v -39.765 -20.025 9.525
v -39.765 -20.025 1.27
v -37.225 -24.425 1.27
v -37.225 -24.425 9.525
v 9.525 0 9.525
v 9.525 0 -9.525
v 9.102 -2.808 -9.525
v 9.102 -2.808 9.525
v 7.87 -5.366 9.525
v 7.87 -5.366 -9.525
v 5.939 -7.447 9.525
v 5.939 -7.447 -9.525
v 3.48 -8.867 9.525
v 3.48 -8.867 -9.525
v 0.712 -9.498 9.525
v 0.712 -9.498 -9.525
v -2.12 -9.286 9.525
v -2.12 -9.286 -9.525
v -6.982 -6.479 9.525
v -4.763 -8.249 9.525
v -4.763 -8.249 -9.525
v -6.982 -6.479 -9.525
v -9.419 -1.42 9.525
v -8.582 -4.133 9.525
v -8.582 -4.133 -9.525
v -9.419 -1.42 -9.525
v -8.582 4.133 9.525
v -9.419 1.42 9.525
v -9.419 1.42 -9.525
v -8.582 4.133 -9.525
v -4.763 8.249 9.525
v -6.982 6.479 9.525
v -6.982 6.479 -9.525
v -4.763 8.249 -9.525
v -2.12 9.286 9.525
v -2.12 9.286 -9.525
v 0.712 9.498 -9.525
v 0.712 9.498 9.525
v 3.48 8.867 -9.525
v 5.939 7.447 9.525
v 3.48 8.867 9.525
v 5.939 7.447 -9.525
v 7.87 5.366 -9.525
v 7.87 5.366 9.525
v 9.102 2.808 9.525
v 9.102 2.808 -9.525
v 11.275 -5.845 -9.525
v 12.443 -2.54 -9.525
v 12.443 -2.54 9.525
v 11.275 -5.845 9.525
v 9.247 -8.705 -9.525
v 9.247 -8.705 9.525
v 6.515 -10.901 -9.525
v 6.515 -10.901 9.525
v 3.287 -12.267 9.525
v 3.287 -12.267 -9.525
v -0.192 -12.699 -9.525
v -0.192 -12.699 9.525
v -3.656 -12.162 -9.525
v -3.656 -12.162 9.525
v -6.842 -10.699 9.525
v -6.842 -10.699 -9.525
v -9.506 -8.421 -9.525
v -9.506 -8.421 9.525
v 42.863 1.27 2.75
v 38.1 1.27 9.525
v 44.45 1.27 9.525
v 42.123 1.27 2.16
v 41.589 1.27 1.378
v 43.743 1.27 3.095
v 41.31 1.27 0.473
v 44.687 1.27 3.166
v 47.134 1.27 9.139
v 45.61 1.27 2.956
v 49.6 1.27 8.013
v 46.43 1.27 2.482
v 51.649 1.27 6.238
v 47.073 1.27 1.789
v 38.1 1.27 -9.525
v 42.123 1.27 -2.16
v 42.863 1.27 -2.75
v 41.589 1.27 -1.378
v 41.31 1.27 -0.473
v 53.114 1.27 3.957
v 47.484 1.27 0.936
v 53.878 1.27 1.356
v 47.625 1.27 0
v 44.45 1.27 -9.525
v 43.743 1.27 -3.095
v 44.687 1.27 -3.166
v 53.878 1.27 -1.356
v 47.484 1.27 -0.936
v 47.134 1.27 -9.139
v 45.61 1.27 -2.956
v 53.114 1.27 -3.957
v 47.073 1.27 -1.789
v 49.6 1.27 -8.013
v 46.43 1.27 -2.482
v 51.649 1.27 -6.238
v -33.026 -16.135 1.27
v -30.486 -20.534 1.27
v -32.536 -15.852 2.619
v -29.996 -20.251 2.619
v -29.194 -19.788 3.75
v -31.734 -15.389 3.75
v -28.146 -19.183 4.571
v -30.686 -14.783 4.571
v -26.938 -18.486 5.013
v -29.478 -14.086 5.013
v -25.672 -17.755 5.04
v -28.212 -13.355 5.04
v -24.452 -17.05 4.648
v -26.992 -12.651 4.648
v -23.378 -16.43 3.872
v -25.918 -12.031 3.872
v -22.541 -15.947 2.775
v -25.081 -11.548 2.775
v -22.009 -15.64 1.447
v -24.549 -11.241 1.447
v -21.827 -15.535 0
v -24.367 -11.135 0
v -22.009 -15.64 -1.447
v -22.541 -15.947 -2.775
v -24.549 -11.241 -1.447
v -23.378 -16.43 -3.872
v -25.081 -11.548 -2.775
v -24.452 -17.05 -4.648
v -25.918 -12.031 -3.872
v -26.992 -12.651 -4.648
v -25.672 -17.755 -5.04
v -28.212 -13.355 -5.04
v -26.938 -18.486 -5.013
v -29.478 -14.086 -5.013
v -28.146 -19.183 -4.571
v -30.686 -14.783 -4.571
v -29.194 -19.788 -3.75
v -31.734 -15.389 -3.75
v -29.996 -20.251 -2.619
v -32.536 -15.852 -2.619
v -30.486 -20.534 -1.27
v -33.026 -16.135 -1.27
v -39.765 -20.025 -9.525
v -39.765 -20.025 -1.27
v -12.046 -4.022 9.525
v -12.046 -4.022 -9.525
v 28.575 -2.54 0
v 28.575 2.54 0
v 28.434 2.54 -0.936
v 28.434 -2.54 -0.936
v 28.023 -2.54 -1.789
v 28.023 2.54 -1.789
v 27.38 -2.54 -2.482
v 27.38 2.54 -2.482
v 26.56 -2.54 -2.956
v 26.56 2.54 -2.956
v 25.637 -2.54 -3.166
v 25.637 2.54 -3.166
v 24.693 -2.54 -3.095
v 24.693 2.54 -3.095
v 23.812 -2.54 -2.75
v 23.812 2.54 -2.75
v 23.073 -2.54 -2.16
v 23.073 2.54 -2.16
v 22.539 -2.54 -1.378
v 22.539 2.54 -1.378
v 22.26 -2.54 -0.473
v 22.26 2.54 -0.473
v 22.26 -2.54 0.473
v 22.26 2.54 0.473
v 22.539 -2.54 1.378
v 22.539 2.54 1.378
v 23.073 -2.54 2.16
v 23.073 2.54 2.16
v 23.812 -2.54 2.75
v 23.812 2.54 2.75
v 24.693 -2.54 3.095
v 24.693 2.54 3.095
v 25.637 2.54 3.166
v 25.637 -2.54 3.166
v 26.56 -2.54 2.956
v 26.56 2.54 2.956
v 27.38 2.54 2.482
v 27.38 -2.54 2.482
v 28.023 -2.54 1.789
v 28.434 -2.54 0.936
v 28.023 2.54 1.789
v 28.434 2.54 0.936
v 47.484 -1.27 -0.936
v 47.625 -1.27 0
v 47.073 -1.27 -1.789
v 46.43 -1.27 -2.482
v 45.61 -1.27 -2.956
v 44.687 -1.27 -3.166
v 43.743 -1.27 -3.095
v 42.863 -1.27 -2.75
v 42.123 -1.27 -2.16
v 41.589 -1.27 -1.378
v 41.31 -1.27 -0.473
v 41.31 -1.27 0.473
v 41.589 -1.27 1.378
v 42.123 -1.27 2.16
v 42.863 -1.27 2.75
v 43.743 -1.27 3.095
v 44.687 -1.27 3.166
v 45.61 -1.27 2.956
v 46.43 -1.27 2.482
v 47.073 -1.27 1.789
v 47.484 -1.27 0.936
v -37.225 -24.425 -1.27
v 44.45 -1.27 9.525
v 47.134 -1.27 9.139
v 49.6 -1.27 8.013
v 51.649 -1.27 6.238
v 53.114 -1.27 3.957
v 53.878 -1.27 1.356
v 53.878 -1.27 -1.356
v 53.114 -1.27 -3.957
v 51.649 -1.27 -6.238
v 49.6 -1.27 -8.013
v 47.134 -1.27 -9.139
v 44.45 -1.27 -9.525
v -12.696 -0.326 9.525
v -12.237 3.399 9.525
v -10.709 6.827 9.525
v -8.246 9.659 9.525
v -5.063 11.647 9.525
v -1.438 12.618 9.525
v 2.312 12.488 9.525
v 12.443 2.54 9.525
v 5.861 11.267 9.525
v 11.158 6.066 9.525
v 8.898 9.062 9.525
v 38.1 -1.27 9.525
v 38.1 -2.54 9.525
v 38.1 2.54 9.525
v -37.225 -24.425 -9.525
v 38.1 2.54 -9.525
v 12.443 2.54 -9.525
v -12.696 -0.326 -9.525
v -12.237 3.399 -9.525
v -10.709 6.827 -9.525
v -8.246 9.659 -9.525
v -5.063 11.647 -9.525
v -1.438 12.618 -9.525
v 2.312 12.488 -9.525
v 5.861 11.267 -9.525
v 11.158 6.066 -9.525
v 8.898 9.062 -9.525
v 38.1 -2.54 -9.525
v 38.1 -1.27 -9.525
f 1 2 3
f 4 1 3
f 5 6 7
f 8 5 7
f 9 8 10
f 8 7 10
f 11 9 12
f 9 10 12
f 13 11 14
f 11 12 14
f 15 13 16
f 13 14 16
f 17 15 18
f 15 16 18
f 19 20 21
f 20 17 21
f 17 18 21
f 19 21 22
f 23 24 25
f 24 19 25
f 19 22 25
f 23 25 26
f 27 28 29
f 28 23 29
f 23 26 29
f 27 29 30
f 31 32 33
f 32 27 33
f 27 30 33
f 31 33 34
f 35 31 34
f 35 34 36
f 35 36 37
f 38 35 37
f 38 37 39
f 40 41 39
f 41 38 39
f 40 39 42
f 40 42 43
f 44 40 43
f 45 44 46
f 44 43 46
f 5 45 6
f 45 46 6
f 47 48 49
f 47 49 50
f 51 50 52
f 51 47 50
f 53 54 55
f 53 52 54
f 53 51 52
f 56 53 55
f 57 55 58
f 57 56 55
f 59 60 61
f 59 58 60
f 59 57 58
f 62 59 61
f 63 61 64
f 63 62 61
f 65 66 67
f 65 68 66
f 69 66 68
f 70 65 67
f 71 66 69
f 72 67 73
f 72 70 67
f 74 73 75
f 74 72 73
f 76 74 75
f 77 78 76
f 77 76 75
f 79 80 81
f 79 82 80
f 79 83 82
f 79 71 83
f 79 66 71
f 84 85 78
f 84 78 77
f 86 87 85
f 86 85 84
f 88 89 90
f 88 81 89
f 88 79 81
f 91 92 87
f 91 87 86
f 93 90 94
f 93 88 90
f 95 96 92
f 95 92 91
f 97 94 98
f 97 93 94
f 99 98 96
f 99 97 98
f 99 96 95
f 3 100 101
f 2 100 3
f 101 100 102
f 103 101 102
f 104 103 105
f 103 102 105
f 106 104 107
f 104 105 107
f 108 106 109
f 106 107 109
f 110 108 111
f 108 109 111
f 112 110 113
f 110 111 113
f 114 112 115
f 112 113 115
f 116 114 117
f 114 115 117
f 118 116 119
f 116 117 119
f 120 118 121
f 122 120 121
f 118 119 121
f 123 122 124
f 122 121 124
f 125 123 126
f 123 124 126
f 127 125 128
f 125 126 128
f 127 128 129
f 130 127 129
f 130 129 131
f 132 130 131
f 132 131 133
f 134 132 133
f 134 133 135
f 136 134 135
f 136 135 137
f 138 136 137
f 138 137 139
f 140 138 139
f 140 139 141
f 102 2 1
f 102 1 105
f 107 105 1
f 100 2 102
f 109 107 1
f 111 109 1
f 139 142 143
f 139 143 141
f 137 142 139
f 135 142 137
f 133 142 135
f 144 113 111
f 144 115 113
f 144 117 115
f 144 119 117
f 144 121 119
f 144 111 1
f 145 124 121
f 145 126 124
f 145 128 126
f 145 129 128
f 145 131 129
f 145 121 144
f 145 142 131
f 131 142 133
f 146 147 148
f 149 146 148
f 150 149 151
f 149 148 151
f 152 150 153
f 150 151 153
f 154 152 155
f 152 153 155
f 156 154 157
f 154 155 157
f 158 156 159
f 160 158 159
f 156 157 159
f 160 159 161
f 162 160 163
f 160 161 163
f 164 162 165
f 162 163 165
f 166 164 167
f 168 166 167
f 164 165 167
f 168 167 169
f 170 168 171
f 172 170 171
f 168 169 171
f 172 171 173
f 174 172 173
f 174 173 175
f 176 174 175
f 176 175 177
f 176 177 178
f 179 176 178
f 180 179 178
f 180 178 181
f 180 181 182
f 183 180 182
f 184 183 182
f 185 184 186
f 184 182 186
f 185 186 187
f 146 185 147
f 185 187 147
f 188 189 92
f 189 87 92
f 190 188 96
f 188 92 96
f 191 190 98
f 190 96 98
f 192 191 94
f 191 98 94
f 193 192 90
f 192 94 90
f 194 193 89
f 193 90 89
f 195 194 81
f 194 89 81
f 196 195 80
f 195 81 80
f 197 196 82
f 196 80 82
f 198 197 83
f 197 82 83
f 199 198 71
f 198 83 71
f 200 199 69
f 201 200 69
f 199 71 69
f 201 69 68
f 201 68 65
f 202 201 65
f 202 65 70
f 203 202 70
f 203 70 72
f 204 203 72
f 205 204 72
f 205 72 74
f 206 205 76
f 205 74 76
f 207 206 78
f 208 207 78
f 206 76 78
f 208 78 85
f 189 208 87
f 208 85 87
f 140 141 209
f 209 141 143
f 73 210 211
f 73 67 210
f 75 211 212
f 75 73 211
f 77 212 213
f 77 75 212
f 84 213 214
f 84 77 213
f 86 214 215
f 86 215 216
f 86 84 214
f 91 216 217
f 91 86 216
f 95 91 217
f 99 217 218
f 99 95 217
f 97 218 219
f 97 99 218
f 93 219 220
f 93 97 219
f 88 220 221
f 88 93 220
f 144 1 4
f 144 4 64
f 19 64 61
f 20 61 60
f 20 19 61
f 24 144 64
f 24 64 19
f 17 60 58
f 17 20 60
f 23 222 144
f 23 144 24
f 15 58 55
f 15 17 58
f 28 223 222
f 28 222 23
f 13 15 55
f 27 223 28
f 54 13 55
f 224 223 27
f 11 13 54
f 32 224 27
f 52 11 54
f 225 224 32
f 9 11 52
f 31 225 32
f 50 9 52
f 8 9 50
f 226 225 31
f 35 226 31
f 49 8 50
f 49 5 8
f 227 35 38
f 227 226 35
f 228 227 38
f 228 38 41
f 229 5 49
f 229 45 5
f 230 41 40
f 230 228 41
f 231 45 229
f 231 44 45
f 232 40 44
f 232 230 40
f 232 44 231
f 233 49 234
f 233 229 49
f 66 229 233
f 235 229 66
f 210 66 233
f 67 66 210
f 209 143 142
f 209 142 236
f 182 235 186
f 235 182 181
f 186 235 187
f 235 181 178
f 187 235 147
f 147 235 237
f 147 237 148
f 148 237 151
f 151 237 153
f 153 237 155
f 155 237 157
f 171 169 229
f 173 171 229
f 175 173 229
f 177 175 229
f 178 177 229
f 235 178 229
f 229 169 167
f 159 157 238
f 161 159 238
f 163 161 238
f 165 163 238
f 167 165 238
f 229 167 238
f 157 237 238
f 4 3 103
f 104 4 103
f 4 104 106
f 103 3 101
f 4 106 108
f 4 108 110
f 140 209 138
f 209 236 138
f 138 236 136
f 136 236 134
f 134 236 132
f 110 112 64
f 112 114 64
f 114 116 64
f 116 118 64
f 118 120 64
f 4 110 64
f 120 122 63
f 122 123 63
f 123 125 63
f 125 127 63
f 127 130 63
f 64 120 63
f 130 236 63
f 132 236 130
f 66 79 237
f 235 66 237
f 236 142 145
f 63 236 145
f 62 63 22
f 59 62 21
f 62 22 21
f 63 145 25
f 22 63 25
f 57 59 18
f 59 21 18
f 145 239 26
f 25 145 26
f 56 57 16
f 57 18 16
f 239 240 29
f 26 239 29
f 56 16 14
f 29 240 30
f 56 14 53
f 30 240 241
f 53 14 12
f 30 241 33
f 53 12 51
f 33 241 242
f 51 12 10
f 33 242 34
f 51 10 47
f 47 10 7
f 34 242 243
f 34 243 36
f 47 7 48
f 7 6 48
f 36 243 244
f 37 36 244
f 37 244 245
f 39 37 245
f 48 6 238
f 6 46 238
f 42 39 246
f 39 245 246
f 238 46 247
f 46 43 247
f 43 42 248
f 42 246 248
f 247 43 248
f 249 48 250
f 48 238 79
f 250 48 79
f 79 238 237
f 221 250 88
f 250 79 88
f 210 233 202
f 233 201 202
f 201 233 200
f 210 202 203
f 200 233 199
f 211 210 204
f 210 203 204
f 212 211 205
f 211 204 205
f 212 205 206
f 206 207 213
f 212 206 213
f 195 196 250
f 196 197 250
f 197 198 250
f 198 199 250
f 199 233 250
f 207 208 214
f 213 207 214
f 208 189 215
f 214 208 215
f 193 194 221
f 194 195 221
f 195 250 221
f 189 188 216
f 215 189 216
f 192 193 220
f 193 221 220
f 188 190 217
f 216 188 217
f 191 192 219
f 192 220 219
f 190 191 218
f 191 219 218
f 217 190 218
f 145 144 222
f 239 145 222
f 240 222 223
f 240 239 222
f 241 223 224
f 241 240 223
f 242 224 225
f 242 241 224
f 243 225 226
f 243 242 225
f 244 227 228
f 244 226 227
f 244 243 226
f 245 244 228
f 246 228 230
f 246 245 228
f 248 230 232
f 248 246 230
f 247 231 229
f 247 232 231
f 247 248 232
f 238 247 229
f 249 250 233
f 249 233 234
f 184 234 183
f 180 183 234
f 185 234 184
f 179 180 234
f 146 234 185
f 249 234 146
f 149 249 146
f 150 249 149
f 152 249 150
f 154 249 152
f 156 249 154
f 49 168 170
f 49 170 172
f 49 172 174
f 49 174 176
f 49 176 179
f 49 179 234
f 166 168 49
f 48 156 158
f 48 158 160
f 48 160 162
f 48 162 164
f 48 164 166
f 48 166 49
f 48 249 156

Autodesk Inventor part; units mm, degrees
ref_plane "YZ Plane" through (0, 0, 0) normal (1, 0, 0) x (0, 1, 0)
ref_plane "XZ Plane" through (0, 0, 0) normal (0, 1, 0) x (-1, 0, 0)
ref_plane "XY Plane" through (0, 0, 0) normal (0, 0, 1) x (1, 0, 0)
sketch "Sketch1" plane through (0, 0, 0) normal (0, 0, 1) x (1, 0, 0)
  circle A0 centre (0, 0) radius 9.525
  line L0 (38.1, 1.27) -> (38.1, 2.54)
  line L1 (38.1, -1.27) -> (38.1, -2.54)
  line L2 (38.1, -2.54) -> (12.4434, -2.54)
  line L3 (38.1, 2.54) -> (12.4434, 2.54)
  line L4 (38.1, 0) -> (44.45, 0)
  line L5 (44.45, 0) -> (44.45, 1.27)
  line L6 (44.45, 1.27) -> (38.1, 1.27)
  line L7 (44.45, -1.27) -> (44.45, 0)
  line L8 (44.45, -1.27) -> (38.1, -1.27)
  line L9 (-38.4948, -22.225) -> (-37.2248, -24.4247)
  line L10 (-37.2248, -24.4247) -> (-9.5063, -8.4214)
  line L11 (-38.4948, -22.225) -> (-39.7648, -20.0253)
  line L12 (-39.7648, -20.0253) -> (-12.0463, -4.022)
  arc A1 (12.4434, 2.54) -> (-12.0463, -4.022) centre (0, 0) ccw
  arc A2 (-9.5063, -8.4214) -> (12.4434, -2.54) centre (0, 0) ccw
  dimension "d1" = 19.05
  dimension "d5" = 38.1
  dimension "d6" = 2.54
  dimension "d7" = 2.54
  dimension "d8" = 6.35
  dimension "d9" = 1.27
  dimension "d11" = 44.45
  dimension "d12" = 2.54
  dimension "d13" = 2.54
  dimension "d36" = 12.7
extrude "Extrusion1" add sketch "Sketch1" along normal mid plane 19.05
sketch "Sketch4" plane through (38.1, 1.27, 9.525) normal (0, 1, 0) x (1, 0, 0)
  arc A0 (6.35, 0) -> (6.35, 19.05) centre (6.35, 9.525) ccw
  line L0 (6.35, 19.05) -> (6.35, 0)
  line L1 (0, 0) -> (6.35, 0) projected
  point P0 (-38.1, 9.525)
  dimension "d16" = 9.525
extrude "Extrusion2" add sketch "Sketch4" against normal blind 2.54
sketch "Sketch5" plane through (38.1, 1.27, 9.525) normal (0, 1, 0) x (1, 0, 0)
  arc A0 (6.35, 0) -> (6.35, 19.05) centre (6.35, 9.525) ccw projected
  circle A1 centre (6.35, 9.525) radius 3.175
  circle A2 centre (-11.5739, 9.525) radius 3.175
  point P0 (-38.1, 9.525)
  dimension "d19" = 6.35
extrude "Extrusion3" cut sketch "Sketch5" against normal through all contours A1
sketch "Sketch6" plane through (12.4434, 2.54, 9.525) normal (0, 1, 0) x (1, 0, 0)
  circle A0 centre (12.9566, 9.525) radius 3.175
  line L0 (25.6566, 19.05) -> (0, 19.05) projected
  line L1 (25.6566, 19.05) -> (25.6566, 0) projected
  point P0 (-12.4434, 9.525)
  dimension "d23" = 6.35
  dimension "d24" = 9.525
  dimension "d25" = 12.7
extrude "Extrusion4" cut sketch "Sketch6" against normal through all
sketch "Sketch7" plane through (-39.7648, -20.0253, 9.525) normal (-0.5, 0.866, 0) x (0.866, 0.5, 0)
  arc A0 (7.7813, 8.255) -> (7.7813, 10.795) centre (12.7, 9.525) ccw
  line L0 (0, 0) -> (0, 19.05) projected
  line L1 (0, 19.05) -> (32.0066, 19.05) projected
  line L2 (7.7813, 10.795) -> (0, 10.795)
  line L3 (7.7813, 8.255) -> (0, 8.255)
  line L4 (0, 10.795) -> (0, 8.255)
  point P0 (44.45, 9.525)
  dimension "d28" = 10.16
  dimension "d29" = 12.7
  dimension "d33" = 9.525
extrude "Extrusion5" cut sketch "Sketch7" against normal through all
properties part number "HW 8 Part 4"
